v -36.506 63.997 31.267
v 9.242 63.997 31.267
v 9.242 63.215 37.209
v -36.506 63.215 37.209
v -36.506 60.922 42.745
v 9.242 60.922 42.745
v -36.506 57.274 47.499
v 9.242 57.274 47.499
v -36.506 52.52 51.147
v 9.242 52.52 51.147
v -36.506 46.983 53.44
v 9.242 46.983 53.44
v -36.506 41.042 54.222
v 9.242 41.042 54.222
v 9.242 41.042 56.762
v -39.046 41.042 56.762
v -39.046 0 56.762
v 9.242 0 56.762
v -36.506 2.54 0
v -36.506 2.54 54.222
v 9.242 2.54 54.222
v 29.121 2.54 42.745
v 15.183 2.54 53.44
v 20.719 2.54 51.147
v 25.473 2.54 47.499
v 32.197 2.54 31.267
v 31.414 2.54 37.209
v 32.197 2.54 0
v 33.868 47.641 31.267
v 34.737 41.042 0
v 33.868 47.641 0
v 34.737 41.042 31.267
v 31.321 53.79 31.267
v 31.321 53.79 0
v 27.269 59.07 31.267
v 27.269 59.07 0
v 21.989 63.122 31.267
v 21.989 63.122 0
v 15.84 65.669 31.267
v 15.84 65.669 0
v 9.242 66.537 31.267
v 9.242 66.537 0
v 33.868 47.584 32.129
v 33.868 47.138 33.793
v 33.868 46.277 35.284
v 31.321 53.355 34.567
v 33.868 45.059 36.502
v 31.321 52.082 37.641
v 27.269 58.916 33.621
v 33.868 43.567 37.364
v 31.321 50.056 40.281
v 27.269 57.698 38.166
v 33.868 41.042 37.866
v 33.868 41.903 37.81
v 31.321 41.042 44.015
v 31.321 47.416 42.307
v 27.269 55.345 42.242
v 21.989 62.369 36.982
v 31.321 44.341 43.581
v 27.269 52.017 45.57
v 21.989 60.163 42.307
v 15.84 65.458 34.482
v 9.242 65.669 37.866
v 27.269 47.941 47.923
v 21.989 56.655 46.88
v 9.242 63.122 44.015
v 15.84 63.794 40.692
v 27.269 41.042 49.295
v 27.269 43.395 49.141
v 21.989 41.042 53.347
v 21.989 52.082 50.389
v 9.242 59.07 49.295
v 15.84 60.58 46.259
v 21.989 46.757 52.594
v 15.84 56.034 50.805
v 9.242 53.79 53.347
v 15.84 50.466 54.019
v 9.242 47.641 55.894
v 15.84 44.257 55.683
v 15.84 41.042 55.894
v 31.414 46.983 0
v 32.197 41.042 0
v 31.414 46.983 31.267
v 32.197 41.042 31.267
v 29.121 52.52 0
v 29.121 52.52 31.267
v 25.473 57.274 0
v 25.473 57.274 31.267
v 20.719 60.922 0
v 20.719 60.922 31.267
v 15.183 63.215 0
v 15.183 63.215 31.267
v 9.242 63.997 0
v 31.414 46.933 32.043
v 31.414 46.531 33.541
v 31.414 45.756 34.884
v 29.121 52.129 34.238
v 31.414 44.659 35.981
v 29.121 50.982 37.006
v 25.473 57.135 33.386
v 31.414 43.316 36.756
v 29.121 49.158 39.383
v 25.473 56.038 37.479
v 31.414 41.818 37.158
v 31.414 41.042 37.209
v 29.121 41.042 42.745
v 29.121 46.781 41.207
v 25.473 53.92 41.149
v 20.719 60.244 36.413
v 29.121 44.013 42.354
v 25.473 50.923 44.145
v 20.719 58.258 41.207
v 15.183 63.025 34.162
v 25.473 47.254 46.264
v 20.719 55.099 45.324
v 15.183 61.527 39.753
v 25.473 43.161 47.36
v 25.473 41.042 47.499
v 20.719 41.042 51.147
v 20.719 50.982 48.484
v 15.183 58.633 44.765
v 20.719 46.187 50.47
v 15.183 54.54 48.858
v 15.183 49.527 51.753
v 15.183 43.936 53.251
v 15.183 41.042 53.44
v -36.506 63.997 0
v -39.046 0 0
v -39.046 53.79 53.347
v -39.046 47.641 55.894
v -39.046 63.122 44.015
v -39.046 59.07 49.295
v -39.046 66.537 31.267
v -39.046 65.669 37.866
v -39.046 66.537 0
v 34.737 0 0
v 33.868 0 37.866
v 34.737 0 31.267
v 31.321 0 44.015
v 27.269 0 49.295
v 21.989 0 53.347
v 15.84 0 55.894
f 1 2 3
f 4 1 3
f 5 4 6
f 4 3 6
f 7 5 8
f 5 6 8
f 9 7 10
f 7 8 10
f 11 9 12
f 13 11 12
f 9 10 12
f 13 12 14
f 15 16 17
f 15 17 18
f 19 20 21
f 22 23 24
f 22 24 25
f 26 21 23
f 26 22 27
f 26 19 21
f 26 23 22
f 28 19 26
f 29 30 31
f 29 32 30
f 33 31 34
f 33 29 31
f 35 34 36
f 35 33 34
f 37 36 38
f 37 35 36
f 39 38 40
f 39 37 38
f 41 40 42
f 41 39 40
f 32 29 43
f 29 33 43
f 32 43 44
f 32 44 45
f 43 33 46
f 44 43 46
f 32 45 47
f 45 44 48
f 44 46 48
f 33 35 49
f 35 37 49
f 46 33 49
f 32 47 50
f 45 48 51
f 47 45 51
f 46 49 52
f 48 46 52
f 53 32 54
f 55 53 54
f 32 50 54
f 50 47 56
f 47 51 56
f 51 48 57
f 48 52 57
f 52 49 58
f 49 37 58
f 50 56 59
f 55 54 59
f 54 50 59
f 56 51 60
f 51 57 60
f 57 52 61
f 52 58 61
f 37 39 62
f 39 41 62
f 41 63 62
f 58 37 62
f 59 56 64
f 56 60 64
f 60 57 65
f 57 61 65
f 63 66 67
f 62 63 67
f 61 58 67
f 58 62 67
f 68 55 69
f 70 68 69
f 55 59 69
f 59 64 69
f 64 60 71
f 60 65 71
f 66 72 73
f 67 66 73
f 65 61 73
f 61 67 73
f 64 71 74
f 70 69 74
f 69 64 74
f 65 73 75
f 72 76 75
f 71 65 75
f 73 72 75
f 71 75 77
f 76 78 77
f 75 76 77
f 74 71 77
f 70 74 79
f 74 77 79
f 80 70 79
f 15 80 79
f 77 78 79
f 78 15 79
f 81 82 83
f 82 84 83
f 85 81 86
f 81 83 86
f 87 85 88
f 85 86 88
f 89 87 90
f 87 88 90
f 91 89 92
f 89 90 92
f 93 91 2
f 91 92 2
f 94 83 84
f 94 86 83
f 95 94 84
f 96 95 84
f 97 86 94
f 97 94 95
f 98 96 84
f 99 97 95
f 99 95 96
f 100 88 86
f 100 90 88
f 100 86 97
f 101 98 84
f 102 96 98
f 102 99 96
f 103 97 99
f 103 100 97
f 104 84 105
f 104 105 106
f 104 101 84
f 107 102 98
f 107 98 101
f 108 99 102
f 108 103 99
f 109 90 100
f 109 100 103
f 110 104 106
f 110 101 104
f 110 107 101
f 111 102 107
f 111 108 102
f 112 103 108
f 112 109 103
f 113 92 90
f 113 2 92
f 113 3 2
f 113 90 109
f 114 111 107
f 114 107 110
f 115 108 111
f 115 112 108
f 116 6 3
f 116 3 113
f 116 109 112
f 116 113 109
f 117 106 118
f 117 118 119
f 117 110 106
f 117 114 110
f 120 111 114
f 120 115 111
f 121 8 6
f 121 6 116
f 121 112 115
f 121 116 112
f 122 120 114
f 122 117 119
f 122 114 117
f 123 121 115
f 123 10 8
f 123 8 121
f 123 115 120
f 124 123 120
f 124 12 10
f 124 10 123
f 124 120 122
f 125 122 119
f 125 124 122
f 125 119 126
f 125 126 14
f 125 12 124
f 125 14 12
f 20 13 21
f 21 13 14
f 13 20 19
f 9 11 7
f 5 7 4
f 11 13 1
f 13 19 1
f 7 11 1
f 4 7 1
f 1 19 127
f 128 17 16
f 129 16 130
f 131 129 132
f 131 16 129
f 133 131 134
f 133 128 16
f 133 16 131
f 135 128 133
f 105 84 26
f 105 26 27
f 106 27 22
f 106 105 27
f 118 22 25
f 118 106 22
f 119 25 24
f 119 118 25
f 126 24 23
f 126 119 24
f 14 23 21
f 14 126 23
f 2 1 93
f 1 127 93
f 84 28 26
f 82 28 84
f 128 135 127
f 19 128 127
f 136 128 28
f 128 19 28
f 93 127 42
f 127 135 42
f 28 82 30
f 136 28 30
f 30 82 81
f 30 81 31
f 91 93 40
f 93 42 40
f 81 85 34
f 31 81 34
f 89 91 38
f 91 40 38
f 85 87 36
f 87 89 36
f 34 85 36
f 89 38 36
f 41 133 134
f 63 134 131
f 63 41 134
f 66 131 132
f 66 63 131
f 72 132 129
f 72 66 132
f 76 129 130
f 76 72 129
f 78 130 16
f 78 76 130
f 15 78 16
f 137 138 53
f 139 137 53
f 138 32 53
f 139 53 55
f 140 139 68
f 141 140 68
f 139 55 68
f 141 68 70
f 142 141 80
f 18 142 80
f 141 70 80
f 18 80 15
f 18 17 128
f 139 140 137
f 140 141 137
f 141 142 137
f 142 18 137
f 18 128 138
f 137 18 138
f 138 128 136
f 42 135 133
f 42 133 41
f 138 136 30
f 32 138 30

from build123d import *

# Parameters (mm, degrees)
F0_W     = 73.782653
F0_H     = 66.537239
F1_DEPTH = 56.762496
F2_R     = 25.49506
F3_T     = -2.54


with BuildPart() as f1:
    # F0 (on Top) → F1 (new body)
    with BuildSketch(Plane.XY):
        with Locations((-2.154655, 33.268619)):
            Rectangle(F0_W, F0_H)
    extrude(amount=F1_DEPTH)

    # F2
    f2_edges = [f1.edges().sort_by_distance(p)[0] for p in [
        (-2.154656, 66.537239, 56.762496),
        (34.736671, 66.537239, 28.381248),
        (34.736671, 33.268619, 56.762496),
    ]]
    fillet(f2_edges, radius=F2_R)

    # F3
    f3_openings = [f1.faces().sort_by_distance(p)[0] for p in [
        (-3.066985, 32.462235, 0),
    ]]
    offset(amount=F3_T, openings=f3_openings)


solid = f1.part
